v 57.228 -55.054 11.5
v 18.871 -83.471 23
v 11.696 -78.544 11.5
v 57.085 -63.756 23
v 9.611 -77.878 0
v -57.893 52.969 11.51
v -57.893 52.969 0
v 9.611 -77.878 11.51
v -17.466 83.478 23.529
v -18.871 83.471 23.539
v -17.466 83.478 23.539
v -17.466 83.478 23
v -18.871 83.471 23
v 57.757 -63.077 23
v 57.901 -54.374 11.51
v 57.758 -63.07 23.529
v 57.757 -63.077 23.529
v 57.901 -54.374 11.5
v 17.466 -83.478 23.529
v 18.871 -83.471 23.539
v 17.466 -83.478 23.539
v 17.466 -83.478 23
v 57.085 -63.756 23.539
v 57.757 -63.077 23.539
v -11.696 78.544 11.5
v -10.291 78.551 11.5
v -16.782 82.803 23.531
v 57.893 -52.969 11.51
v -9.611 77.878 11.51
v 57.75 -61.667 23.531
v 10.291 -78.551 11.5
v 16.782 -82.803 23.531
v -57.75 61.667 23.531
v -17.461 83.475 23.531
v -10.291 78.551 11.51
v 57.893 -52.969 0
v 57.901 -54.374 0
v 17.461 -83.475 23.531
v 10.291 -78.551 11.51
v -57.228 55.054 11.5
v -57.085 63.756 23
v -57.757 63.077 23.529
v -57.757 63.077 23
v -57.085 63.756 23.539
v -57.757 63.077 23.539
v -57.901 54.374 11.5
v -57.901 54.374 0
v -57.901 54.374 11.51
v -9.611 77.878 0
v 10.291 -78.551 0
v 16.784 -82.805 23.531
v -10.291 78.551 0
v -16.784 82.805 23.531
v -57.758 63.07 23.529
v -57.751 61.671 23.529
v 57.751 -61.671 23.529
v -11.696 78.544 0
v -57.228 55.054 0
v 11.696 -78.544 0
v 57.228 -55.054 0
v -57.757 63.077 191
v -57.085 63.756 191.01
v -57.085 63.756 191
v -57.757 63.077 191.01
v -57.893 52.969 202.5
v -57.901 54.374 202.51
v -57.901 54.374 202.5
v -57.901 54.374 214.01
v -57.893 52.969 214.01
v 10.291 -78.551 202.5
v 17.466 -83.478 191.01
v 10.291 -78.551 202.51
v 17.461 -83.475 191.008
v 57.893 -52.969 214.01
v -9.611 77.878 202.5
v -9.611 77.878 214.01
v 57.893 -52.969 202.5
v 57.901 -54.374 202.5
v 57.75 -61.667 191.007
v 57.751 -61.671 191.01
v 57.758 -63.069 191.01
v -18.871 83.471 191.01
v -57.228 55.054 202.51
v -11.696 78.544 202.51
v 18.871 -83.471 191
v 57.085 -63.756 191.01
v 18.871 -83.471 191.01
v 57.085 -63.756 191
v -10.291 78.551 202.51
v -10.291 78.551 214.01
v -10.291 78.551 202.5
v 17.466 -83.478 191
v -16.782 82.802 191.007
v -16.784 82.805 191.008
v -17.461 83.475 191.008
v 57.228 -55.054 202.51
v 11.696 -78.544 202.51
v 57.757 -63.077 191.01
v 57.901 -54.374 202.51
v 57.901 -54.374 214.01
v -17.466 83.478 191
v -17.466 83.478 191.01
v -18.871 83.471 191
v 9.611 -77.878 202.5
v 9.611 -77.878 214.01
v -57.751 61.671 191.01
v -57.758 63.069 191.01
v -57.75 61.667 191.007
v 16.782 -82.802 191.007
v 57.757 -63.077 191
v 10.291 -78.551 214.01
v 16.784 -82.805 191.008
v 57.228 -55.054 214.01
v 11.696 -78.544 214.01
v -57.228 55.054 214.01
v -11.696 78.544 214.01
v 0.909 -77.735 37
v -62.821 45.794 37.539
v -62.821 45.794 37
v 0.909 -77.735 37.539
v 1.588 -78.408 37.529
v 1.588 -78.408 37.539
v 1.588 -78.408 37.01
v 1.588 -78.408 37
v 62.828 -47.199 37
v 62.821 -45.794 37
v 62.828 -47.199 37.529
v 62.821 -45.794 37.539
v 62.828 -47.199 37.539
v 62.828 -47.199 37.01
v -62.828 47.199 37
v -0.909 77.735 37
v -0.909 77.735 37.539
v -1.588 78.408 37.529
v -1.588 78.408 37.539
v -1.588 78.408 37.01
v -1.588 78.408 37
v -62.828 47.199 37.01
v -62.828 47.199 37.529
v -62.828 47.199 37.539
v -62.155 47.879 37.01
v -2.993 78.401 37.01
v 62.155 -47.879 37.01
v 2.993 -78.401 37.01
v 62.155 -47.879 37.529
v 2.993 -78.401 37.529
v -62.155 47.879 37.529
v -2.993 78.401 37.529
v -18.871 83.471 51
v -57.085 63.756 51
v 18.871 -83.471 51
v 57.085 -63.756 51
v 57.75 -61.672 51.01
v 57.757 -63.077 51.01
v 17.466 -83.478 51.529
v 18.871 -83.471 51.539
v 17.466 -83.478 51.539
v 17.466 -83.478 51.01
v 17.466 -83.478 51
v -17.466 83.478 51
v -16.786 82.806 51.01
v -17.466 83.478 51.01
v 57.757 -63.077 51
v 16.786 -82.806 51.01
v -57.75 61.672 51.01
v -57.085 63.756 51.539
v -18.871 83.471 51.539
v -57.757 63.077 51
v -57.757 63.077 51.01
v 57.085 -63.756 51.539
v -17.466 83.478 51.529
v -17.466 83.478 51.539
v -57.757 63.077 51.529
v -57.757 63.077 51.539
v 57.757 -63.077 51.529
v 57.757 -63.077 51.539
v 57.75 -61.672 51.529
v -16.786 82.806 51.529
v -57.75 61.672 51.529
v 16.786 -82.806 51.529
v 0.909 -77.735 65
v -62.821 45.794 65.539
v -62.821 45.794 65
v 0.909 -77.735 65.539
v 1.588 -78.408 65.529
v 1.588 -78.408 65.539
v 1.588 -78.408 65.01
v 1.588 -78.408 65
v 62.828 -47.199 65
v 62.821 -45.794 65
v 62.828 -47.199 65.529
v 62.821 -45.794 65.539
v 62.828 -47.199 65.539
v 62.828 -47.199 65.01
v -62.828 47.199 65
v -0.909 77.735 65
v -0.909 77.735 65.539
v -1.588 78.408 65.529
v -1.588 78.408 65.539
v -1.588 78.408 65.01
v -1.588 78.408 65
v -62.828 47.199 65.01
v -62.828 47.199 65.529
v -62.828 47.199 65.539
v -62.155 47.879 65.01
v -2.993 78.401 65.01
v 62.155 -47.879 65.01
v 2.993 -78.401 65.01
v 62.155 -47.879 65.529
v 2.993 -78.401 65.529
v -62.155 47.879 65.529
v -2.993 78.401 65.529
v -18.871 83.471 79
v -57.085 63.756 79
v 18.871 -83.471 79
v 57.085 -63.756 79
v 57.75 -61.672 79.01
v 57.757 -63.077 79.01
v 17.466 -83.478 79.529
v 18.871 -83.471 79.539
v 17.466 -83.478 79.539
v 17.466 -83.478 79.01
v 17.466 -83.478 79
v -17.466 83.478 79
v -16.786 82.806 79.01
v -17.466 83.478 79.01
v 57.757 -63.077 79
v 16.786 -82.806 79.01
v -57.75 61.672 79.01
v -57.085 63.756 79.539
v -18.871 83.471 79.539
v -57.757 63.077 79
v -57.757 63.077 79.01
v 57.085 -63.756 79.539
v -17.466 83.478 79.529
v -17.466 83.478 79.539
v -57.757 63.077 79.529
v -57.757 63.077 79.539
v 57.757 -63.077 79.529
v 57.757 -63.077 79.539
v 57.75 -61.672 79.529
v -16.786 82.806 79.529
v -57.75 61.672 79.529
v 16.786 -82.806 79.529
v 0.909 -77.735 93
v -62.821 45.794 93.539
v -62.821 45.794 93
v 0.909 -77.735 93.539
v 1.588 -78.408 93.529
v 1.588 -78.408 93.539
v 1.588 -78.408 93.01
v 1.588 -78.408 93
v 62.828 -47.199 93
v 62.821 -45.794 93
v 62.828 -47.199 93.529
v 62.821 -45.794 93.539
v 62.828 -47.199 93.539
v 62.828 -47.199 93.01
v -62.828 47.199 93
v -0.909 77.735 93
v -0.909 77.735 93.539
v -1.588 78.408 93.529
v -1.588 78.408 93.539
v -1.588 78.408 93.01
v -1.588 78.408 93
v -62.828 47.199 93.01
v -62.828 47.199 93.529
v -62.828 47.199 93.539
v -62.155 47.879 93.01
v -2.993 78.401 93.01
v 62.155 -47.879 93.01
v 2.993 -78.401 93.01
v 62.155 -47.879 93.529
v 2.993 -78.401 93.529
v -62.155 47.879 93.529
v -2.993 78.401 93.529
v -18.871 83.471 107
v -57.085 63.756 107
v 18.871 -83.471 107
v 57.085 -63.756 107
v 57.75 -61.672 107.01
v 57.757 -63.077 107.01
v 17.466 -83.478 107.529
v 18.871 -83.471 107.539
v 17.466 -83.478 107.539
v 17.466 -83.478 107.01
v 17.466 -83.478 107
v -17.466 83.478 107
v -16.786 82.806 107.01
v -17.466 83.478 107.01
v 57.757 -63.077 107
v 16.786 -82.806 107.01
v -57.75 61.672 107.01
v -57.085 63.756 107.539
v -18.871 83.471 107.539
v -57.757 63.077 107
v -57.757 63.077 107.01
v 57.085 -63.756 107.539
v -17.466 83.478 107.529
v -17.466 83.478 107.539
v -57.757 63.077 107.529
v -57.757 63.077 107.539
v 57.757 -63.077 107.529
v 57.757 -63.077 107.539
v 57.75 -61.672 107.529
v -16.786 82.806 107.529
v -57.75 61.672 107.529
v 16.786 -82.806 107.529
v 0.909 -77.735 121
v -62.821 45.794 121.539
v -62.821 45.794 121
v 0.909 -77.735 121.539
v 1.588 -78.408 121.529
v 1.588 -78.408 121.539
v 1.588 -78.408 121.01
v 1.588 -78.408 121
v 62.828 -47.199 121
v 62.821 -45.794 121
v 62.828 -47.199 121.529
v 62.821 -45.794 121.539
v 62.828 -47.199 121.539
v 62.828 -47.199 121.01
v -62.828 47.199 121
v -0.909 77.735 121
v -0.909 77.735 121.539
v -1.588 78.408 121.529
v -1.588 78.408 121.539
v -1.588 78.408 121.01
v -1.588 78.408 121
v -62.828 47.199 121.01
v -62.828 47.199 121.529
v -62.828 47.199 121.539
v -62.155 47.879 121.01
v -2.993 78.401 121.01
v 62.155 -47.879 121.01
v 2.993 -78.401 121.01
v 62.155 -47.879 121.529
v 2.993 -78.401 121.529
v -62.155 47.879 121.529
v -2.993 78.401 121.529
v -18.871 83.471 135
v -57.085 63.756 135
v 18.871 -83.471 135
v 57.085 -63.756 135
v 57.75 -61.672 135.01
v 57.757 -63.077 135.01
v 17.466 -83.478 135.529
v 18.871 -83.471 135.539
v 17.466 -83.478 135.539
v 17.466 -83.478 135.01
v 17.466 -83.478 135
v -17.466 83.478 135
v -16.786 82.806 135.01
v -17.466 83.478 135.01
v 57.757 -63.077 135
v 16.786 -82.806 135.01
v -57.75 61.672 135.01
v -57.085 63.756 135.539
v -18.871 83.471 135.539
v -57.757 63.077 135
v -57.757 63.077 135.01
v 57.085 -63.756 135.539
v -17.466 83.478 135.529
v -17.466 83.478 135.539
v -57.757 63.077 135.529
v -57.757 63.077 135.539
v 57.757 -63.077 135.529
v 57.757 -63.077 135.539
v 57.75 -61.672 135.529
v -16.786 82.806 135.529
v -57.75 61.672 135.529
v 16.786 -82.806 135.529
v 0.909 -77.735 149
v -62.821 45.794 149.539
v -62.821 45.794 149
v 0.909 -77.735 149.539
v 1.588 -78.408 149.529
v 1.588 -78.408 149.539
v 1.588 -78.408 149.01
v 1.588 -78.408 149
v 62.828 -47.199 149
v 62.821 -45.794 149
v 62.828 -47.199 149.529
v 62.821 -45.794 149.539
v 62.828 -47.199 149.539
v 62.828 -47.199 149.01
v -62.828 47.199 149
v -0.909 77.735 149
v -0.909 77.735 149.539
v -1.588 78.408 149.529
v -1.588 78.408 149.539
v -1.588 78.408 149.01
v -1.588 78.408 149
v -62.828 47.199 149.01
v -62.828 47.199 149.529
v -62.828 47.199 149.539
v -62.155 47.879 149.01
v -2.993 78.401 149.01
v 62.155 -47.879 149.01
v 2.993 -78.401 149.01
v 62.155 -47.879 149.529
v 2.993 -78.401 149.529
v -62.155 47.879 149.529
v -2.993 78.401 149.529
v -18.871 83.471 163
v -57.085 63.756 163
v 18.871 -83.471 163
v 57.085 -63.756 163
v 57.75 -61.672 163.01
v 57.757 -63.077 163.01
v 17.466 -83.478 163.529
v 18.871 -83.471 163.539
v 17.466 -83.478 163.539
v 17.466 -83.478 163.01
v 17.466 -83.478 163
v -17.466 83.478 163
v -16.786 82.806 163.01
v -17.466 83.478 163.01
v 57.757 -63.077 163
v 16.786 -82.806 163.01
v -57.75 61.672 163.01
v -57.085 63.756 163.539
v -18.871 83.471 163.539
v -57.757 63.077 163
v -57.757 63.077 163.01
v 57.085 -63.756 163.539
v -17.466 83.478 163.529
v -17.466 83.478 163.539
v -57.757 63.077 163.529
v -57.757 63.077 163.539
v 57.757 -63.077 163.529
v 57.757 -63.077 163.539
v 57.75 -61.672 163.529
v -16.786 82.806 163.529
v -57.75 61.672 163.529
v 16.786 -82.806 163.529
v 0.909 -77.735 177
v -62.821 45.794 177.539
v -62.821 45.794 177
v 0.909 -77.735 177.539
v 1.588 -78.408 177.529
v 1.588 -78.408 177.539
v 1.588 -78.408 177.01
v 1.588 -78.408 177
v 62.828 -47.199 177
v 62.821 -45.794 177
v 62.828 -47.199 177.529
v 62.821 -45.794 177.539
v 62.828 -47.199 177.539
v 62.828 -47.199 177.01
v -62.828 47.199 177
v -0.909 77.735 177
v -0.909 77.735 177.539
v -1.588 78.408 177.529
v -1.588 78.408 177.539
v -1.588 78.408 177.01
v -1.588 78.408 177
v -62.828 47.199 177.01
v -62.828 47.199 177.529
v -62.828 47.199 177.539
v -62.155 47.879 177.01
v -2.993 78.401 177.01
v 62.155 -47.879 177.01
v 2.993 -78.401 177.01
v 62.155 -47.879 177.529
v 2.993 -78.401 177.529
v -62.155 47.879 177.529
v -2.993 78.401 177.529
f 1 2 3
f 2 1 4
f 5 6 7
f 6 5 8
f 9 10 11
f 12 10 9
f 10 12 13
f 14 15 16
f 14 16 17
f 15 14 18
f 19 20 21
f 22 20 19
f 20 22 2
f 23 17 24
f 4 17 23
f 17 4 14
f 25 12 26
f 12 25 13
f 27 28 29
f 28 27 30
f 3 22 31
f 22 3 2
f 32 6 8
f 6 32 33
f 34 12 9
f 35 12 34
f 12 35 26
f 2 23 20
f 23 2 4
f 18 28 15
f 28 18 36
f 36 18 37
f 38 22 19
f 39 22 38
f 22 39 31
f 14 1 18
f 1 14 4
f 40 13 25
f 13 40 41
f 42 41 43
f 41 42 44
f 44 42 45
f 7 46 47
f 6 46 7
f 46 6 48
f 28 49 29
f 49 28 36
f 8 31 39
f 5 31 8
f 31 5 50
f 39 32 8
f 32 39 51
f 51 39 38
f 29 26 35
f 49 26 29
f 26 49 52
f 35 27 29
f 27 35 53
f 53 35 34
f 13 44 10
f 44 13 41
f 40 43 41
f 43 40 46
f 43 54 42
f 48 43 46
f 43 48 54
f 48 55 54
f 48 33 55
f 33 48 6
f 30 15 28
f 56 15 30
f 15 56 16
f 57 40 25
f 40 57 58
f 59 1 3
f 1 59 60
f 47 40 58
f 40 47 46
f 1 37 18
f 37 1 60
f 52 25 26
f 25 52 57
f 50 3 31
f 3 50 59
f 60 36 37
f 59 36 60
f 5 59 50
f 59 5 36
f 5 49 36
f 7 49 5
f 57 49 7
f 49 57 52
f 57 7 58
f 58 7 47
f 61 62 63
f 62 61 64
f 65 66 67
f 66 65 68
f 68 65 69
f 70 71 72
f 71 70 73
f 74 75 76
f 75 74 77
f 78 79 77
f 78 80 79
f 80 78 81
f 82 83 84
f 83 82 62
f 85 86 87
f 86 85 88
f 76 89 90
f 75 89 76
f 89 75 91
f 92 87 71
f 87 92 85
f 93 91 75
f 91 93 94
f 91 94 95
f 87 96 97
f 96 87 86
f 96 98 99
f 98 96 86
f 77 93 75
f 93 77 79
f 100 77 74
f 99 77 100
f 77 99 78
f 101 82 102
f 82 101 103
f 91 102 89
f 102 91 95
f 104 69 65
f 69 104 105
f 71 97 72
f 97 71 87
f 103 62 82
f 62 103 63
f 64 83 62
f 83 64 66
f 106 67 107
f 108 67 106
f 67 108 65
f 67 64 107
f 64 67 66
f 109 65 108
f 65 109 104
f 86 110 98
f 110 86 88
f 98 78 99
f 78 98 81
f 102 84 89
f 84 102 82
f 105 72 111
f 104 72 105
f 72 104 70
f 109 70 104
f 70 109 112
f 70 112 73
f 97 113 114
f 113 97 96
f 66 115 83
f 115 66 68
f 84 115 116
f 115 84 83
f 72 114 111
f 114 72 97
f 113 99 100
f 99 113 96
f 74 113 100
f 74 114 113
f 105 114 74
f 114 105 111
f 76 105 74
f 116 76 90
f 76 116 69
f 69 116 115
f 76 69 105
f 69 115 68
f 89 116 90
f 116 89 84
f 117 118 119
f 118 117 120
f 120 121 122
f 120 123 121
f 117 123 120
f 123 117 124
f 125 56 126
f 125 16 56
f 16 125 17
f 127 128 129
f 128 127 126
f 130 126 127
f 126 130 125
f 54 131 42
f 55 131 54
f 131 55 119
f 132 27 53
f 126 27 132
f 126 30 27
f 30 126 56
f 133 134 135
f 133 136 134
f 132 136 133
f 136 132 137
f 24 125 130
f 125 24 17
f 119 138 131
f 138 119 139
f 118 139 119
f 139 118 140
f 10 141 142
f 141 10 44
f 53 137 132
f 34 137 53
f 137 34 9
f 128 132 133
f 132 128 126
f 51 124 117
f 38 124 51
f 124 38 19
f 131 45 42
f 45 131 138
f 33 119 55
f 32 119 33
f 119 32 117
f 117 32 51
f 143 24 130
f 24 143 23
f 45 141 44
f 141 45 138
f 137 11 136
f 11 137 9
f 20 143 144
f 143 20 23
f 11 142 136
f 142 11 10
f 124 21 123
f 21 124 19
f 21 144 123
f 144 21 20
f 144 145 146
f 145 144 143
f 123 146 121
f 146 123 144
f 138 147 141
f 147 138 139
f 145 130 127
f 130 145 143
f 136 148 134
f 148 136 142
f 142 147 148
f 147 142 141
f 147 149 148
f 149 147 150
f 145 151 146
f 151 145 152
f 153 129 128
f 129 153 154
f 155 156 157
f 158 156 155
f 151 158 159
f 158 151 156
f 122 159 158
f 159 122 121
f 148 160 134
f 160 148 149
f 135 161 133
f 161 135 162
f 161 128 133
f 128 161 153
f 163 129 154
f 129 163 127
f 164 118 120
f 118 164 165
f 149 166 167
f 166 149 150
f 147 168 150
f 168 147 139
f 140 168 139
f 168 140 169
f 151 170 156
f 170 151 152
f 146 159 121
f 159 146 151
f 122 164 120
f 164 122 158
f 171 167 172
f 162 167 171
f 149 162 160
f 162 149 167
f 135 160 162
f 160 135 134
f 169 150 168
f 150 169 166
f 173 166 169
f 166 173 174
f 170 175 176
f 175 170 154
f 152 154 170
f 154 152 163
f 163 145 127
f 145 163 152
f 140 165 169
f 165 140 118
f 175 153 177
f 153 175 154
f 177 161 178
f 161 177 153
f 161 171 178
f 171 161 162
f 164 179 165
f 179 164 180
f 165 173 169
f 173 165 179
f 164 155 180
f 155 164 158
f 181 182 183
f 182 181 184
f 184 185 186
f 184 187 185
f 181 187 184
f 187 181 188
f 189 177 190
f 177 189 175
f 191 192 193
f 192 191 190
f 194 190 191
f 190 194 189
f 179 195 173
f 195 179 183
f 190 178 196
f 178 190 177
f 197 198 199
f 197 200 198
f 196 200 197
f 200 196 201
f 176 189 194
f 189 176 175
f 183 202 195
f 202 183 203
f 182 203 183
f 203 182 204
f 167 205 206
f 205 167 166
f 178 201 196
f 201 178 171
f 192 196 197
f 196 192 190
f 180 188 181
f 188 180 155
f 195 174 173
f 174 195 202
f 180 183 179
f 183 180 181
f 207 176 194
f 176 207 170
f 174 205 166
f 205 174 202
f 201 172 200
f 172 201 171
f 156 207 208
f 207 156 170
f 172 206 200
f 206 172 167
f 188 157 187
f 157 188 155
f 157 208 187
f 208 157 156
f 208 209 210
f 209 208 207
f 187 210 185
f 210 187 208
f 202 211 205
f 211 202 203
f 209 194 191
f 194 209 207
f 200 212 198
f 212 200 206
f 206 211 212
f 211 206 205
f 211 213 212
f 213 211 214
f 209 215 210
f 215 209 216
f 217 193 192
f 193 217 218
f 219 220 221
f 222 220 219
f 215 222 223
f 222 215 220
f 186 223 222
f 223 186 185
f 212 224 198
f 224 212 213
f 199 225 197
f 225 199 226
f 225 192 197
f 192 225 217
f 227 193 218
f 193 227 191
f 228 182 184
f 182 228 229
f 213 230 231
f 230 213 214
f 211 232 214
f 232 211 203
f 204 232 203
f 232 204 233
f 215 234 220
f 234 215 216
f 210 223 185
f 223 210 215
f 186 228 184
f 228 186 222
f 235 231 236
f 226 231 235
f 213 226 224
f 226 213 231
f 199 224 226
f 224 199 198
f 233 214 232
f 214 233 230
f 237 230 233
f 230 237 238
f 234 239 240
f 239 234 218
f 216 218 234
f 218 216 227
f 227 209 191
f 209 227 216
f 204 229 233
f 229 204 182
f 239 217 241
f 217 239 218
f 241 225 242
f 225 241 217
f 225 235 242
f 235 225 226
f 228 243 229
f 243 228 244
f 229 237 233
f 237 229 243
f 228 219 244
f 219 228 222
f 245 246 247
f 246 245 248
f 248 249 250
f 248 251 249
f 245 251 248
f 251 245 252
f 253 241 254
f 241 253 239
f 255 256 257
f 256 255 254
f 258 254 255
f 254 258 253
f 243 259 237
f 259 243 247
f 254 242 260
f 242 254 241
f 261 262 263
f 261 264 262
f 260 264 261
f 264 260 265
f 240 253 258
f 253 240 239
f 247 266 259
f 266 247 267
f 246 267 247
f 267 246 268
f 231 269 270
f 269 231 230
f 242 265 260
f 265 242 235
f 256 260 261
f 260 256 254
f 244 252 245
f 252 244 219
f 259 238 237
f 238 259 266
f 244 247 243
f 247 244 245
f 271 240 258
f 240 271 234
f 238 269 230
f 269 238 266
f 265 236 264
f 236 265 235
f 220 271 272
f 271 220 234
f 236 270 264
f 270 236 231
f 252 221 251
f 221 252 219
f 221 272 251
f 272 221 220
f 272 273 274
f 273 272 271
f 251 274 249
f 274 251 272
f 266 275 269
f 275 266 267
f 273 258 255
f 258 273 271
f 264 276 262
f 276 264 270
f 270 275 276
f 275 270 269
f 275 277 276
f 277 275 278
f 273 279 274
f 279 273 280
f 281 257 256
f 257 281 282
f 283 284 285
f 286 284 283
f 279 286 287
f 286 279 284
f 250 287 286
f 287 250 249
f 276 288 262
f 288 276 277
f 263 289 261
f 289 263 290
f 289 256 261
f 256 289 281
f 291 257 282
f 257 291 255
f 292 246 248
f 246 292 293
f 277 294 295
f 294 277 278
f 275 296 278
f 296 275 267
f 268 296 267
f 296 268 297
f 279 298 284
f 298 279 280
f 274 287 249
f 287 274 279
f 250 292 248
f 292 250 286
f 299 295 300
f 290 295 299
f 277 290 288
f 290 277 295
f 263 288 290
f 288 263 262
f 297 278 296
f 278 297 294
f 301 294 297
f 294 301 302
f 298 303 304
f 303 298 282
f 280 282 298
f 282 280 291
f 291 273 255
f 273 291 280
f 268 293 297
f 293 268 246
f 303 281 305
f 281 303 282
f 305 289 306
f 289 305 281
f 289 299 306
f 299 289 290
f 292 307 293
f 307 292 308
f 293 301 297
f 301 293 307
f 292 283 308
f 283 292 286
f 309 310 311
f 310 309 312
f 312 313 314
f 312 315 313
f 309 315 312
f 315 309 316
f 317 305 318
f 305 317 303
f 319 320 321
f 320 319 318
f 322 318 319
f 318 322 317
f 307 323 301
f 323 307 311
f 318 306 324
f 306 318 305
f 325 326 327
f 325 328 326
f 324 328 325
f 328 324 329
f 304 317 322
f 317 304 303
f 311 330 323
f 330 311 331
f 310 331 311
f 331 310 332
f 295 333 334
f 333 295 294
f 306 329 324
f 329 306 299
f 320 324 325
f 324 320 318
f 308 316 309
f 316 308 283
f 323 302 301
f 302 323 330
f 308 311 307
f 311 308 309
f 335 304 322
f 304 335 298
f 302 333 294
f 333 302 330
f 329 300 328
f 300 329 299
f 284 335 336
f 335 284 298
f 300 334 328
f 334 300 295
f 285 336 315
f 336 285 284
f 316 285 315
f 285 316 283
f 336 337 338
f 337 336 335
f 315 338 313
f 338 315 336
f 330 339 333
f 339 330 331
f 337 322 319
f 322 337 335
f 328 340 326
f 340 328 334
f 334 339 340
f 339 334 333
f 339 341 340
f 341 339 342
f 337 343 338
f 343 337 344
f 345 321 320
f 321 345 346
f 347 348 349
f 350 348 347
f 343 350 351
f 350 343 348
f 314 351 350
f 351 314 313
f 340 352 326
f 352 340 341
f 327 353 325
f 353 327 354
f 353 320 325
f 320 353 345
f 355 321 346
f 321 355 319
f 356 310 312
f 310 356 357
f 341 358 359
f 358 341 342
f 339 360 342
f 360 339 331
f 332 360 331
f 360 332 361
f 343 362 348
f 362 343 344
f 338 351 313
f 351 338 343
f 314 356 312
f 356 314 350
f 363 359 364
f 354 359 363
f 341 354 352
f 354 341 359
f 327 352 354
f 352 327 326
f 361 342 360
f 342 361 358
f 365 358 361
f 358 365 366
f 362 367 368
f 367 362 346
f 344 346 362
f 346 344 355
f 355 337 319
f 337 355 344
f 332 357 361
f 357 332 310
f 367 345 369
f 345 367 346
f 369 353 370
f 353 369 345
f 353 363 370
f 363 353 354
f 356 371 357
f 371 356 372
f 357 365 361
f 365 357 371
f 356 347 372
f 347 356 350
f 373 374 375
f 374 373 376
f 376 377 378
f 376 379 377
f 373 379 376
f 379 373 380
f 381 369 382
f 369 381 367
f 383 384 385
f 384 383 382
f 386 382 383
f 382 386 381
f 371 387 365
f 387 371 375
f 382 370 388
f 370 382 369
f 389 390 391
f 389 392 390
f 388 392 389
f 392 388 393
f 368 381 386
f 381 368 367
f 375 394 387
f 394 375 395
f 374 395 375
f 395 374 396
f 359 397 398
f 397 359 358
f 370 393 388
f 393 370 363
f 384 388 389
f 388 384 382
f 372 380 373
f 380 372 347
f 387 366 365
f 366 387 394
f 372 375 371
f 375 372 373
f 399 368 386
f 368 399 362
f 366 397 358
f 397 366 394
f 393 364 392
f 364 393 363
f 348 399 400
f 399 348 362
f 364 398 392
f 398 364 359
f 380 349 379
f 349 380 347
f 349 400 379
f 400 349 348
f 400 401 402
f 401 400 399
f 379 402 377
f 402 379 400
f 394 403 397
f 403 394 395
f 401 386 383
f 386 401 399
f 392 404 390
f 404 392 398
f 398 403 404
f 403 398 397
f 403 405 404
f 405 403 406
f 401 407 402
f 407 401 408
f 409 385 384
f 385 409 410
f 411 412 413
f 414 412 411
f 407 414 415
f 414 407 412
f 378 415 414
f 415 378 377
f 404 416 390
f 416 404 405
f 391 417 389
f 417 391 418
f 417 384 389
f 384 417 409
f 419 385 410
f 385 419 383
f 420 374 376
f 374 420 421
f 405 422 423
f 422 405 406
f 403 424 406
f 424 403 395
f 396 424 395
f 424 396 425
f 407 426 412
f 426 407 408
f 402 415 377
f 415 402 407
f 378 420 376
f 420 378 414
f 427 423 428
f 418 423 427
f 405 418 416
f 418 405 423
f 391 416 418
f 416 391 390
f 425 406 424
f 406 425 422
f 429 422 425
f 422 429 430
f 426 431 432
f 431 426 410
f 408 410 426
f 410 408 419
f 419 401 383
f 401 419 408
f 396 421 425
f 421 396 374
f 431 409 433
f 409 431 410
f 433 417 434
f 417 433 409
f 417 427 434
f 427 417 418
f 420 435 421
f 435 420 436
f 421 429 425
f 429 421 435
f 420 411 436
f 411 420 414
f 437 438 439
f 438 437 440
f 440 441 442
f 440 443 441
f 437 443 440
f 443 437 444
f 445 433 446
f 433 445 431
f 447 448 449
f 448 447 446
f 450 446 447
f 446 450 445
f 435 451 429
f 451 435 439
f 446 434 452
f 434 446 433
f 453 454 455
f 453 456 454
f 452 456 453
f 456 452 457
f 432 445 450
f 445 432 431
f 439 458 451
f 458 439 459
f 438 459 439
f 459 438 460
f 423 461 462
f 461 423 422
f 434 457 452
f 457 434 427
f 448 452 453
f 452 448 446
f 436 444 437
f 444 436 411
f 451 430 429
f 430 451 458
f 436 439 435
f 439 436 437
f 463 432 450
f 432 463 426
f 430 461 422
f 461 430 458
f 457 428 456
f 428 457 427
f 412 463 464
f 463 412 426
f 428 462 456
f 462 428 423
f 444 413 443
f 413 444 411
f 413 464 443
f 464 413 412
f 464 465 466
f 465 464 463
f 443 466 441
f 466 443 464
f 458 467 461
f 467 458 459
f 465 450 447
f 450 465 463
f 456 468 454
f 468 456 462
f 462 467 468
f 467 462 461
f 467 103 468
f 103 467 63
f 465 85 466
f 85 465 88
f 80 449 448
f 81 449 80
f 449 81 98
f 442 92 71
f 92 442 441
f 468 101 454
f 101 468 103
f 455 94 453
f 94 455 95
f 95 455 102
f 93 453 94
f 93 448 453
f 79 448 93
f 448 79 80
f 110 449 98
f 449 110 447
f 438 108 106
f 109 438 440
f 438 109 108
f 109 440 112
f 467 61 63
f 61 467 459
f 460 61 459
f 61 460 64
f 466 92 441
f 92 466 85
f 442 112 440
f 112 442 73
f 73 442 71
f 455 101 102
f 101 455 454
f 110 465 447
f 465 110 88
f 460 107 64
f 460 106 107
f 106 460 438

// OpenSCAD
x = round(rnd(5,150));
y = round(rnd(5,150));
approx_z = rnd(40,200);
steps =  round(rnd(approx_z /10,approx_z /20));
step = round(approx_z/steps);

z = step*steps;
step2 = floor(step * 2);
ext = rnd(0.2,1.7);
radi = rnd(0,3);
verticalsegment = rnd(0,1);
sleeve = round(rnd(5,25));
sleeve_ext = rnd(-0.1,0.5);
sleeveext = sleeve*sleeve_ext;
rotate([0,0,rnd(360)]){
sleeves();
body();
}
module sleeves() {
  hull() {
    translate([0, 0, verticalsegment+  sleeve]) plane(x, y, 0);
    translate([0, 0,   sleeve]) plane(x, y, 0);
    translate([0, 0, sleeve- min(step,sleeve*0.5)]) sleeve(x, y);
  }
  hull() {
    translate([0, 0, sleeve- min(step,sleeve*0.5)]) sleeve(x, y);
    translate([0, 0, 0]) sleeve(x, y);
  }

  hull() {
    translate([0, 0, sleeve]) plane(x, y, z);
    translate([0, 0, z + sleeve + min(step,sleeve*0.5)]) sleeve(x, y);
  }
  hull() {
    translate([0, 0, z + sleeve + sleeve]) sleeve(x, y);
    translate([0, 0, z + sleeve + min(step,sleeve*0.5)]) sleeve(x, y);
  }
}
module body() {
  for (i = [0: step: z - step]) {
    hull() {
      translate([0, 0, verticalsegment + sleeve]) plane(x, y, i);
      translate([0, 0, sleeve]) plane(x, y, i);
    }
    hull() {
      translate([0, 0, verticalsegment + sleeve]) plane(x, y, i);
      translate([0, 0, sleeve]) plane(x, y, i + step);
    }
  }
}
module plane(x, y, z) {
  translate([0, 0, z]) linear_extrude(0.01) offset(r = radi, $fn = 10) square([x + (z % step2) * ext, y + ((z + step) % step2) * ext], center = true);
}
module sleeve(x, y) {
  translate([0, 0, 0]) linear_extrude(0.01) offset(r = radi, $fn = 10) square([x + sleeveext * 2, y + sleeveext * 2], center = true);
}

function rnd(a=0,b=1)=(rands(min(a,b),max(a,b),1)[0]);
